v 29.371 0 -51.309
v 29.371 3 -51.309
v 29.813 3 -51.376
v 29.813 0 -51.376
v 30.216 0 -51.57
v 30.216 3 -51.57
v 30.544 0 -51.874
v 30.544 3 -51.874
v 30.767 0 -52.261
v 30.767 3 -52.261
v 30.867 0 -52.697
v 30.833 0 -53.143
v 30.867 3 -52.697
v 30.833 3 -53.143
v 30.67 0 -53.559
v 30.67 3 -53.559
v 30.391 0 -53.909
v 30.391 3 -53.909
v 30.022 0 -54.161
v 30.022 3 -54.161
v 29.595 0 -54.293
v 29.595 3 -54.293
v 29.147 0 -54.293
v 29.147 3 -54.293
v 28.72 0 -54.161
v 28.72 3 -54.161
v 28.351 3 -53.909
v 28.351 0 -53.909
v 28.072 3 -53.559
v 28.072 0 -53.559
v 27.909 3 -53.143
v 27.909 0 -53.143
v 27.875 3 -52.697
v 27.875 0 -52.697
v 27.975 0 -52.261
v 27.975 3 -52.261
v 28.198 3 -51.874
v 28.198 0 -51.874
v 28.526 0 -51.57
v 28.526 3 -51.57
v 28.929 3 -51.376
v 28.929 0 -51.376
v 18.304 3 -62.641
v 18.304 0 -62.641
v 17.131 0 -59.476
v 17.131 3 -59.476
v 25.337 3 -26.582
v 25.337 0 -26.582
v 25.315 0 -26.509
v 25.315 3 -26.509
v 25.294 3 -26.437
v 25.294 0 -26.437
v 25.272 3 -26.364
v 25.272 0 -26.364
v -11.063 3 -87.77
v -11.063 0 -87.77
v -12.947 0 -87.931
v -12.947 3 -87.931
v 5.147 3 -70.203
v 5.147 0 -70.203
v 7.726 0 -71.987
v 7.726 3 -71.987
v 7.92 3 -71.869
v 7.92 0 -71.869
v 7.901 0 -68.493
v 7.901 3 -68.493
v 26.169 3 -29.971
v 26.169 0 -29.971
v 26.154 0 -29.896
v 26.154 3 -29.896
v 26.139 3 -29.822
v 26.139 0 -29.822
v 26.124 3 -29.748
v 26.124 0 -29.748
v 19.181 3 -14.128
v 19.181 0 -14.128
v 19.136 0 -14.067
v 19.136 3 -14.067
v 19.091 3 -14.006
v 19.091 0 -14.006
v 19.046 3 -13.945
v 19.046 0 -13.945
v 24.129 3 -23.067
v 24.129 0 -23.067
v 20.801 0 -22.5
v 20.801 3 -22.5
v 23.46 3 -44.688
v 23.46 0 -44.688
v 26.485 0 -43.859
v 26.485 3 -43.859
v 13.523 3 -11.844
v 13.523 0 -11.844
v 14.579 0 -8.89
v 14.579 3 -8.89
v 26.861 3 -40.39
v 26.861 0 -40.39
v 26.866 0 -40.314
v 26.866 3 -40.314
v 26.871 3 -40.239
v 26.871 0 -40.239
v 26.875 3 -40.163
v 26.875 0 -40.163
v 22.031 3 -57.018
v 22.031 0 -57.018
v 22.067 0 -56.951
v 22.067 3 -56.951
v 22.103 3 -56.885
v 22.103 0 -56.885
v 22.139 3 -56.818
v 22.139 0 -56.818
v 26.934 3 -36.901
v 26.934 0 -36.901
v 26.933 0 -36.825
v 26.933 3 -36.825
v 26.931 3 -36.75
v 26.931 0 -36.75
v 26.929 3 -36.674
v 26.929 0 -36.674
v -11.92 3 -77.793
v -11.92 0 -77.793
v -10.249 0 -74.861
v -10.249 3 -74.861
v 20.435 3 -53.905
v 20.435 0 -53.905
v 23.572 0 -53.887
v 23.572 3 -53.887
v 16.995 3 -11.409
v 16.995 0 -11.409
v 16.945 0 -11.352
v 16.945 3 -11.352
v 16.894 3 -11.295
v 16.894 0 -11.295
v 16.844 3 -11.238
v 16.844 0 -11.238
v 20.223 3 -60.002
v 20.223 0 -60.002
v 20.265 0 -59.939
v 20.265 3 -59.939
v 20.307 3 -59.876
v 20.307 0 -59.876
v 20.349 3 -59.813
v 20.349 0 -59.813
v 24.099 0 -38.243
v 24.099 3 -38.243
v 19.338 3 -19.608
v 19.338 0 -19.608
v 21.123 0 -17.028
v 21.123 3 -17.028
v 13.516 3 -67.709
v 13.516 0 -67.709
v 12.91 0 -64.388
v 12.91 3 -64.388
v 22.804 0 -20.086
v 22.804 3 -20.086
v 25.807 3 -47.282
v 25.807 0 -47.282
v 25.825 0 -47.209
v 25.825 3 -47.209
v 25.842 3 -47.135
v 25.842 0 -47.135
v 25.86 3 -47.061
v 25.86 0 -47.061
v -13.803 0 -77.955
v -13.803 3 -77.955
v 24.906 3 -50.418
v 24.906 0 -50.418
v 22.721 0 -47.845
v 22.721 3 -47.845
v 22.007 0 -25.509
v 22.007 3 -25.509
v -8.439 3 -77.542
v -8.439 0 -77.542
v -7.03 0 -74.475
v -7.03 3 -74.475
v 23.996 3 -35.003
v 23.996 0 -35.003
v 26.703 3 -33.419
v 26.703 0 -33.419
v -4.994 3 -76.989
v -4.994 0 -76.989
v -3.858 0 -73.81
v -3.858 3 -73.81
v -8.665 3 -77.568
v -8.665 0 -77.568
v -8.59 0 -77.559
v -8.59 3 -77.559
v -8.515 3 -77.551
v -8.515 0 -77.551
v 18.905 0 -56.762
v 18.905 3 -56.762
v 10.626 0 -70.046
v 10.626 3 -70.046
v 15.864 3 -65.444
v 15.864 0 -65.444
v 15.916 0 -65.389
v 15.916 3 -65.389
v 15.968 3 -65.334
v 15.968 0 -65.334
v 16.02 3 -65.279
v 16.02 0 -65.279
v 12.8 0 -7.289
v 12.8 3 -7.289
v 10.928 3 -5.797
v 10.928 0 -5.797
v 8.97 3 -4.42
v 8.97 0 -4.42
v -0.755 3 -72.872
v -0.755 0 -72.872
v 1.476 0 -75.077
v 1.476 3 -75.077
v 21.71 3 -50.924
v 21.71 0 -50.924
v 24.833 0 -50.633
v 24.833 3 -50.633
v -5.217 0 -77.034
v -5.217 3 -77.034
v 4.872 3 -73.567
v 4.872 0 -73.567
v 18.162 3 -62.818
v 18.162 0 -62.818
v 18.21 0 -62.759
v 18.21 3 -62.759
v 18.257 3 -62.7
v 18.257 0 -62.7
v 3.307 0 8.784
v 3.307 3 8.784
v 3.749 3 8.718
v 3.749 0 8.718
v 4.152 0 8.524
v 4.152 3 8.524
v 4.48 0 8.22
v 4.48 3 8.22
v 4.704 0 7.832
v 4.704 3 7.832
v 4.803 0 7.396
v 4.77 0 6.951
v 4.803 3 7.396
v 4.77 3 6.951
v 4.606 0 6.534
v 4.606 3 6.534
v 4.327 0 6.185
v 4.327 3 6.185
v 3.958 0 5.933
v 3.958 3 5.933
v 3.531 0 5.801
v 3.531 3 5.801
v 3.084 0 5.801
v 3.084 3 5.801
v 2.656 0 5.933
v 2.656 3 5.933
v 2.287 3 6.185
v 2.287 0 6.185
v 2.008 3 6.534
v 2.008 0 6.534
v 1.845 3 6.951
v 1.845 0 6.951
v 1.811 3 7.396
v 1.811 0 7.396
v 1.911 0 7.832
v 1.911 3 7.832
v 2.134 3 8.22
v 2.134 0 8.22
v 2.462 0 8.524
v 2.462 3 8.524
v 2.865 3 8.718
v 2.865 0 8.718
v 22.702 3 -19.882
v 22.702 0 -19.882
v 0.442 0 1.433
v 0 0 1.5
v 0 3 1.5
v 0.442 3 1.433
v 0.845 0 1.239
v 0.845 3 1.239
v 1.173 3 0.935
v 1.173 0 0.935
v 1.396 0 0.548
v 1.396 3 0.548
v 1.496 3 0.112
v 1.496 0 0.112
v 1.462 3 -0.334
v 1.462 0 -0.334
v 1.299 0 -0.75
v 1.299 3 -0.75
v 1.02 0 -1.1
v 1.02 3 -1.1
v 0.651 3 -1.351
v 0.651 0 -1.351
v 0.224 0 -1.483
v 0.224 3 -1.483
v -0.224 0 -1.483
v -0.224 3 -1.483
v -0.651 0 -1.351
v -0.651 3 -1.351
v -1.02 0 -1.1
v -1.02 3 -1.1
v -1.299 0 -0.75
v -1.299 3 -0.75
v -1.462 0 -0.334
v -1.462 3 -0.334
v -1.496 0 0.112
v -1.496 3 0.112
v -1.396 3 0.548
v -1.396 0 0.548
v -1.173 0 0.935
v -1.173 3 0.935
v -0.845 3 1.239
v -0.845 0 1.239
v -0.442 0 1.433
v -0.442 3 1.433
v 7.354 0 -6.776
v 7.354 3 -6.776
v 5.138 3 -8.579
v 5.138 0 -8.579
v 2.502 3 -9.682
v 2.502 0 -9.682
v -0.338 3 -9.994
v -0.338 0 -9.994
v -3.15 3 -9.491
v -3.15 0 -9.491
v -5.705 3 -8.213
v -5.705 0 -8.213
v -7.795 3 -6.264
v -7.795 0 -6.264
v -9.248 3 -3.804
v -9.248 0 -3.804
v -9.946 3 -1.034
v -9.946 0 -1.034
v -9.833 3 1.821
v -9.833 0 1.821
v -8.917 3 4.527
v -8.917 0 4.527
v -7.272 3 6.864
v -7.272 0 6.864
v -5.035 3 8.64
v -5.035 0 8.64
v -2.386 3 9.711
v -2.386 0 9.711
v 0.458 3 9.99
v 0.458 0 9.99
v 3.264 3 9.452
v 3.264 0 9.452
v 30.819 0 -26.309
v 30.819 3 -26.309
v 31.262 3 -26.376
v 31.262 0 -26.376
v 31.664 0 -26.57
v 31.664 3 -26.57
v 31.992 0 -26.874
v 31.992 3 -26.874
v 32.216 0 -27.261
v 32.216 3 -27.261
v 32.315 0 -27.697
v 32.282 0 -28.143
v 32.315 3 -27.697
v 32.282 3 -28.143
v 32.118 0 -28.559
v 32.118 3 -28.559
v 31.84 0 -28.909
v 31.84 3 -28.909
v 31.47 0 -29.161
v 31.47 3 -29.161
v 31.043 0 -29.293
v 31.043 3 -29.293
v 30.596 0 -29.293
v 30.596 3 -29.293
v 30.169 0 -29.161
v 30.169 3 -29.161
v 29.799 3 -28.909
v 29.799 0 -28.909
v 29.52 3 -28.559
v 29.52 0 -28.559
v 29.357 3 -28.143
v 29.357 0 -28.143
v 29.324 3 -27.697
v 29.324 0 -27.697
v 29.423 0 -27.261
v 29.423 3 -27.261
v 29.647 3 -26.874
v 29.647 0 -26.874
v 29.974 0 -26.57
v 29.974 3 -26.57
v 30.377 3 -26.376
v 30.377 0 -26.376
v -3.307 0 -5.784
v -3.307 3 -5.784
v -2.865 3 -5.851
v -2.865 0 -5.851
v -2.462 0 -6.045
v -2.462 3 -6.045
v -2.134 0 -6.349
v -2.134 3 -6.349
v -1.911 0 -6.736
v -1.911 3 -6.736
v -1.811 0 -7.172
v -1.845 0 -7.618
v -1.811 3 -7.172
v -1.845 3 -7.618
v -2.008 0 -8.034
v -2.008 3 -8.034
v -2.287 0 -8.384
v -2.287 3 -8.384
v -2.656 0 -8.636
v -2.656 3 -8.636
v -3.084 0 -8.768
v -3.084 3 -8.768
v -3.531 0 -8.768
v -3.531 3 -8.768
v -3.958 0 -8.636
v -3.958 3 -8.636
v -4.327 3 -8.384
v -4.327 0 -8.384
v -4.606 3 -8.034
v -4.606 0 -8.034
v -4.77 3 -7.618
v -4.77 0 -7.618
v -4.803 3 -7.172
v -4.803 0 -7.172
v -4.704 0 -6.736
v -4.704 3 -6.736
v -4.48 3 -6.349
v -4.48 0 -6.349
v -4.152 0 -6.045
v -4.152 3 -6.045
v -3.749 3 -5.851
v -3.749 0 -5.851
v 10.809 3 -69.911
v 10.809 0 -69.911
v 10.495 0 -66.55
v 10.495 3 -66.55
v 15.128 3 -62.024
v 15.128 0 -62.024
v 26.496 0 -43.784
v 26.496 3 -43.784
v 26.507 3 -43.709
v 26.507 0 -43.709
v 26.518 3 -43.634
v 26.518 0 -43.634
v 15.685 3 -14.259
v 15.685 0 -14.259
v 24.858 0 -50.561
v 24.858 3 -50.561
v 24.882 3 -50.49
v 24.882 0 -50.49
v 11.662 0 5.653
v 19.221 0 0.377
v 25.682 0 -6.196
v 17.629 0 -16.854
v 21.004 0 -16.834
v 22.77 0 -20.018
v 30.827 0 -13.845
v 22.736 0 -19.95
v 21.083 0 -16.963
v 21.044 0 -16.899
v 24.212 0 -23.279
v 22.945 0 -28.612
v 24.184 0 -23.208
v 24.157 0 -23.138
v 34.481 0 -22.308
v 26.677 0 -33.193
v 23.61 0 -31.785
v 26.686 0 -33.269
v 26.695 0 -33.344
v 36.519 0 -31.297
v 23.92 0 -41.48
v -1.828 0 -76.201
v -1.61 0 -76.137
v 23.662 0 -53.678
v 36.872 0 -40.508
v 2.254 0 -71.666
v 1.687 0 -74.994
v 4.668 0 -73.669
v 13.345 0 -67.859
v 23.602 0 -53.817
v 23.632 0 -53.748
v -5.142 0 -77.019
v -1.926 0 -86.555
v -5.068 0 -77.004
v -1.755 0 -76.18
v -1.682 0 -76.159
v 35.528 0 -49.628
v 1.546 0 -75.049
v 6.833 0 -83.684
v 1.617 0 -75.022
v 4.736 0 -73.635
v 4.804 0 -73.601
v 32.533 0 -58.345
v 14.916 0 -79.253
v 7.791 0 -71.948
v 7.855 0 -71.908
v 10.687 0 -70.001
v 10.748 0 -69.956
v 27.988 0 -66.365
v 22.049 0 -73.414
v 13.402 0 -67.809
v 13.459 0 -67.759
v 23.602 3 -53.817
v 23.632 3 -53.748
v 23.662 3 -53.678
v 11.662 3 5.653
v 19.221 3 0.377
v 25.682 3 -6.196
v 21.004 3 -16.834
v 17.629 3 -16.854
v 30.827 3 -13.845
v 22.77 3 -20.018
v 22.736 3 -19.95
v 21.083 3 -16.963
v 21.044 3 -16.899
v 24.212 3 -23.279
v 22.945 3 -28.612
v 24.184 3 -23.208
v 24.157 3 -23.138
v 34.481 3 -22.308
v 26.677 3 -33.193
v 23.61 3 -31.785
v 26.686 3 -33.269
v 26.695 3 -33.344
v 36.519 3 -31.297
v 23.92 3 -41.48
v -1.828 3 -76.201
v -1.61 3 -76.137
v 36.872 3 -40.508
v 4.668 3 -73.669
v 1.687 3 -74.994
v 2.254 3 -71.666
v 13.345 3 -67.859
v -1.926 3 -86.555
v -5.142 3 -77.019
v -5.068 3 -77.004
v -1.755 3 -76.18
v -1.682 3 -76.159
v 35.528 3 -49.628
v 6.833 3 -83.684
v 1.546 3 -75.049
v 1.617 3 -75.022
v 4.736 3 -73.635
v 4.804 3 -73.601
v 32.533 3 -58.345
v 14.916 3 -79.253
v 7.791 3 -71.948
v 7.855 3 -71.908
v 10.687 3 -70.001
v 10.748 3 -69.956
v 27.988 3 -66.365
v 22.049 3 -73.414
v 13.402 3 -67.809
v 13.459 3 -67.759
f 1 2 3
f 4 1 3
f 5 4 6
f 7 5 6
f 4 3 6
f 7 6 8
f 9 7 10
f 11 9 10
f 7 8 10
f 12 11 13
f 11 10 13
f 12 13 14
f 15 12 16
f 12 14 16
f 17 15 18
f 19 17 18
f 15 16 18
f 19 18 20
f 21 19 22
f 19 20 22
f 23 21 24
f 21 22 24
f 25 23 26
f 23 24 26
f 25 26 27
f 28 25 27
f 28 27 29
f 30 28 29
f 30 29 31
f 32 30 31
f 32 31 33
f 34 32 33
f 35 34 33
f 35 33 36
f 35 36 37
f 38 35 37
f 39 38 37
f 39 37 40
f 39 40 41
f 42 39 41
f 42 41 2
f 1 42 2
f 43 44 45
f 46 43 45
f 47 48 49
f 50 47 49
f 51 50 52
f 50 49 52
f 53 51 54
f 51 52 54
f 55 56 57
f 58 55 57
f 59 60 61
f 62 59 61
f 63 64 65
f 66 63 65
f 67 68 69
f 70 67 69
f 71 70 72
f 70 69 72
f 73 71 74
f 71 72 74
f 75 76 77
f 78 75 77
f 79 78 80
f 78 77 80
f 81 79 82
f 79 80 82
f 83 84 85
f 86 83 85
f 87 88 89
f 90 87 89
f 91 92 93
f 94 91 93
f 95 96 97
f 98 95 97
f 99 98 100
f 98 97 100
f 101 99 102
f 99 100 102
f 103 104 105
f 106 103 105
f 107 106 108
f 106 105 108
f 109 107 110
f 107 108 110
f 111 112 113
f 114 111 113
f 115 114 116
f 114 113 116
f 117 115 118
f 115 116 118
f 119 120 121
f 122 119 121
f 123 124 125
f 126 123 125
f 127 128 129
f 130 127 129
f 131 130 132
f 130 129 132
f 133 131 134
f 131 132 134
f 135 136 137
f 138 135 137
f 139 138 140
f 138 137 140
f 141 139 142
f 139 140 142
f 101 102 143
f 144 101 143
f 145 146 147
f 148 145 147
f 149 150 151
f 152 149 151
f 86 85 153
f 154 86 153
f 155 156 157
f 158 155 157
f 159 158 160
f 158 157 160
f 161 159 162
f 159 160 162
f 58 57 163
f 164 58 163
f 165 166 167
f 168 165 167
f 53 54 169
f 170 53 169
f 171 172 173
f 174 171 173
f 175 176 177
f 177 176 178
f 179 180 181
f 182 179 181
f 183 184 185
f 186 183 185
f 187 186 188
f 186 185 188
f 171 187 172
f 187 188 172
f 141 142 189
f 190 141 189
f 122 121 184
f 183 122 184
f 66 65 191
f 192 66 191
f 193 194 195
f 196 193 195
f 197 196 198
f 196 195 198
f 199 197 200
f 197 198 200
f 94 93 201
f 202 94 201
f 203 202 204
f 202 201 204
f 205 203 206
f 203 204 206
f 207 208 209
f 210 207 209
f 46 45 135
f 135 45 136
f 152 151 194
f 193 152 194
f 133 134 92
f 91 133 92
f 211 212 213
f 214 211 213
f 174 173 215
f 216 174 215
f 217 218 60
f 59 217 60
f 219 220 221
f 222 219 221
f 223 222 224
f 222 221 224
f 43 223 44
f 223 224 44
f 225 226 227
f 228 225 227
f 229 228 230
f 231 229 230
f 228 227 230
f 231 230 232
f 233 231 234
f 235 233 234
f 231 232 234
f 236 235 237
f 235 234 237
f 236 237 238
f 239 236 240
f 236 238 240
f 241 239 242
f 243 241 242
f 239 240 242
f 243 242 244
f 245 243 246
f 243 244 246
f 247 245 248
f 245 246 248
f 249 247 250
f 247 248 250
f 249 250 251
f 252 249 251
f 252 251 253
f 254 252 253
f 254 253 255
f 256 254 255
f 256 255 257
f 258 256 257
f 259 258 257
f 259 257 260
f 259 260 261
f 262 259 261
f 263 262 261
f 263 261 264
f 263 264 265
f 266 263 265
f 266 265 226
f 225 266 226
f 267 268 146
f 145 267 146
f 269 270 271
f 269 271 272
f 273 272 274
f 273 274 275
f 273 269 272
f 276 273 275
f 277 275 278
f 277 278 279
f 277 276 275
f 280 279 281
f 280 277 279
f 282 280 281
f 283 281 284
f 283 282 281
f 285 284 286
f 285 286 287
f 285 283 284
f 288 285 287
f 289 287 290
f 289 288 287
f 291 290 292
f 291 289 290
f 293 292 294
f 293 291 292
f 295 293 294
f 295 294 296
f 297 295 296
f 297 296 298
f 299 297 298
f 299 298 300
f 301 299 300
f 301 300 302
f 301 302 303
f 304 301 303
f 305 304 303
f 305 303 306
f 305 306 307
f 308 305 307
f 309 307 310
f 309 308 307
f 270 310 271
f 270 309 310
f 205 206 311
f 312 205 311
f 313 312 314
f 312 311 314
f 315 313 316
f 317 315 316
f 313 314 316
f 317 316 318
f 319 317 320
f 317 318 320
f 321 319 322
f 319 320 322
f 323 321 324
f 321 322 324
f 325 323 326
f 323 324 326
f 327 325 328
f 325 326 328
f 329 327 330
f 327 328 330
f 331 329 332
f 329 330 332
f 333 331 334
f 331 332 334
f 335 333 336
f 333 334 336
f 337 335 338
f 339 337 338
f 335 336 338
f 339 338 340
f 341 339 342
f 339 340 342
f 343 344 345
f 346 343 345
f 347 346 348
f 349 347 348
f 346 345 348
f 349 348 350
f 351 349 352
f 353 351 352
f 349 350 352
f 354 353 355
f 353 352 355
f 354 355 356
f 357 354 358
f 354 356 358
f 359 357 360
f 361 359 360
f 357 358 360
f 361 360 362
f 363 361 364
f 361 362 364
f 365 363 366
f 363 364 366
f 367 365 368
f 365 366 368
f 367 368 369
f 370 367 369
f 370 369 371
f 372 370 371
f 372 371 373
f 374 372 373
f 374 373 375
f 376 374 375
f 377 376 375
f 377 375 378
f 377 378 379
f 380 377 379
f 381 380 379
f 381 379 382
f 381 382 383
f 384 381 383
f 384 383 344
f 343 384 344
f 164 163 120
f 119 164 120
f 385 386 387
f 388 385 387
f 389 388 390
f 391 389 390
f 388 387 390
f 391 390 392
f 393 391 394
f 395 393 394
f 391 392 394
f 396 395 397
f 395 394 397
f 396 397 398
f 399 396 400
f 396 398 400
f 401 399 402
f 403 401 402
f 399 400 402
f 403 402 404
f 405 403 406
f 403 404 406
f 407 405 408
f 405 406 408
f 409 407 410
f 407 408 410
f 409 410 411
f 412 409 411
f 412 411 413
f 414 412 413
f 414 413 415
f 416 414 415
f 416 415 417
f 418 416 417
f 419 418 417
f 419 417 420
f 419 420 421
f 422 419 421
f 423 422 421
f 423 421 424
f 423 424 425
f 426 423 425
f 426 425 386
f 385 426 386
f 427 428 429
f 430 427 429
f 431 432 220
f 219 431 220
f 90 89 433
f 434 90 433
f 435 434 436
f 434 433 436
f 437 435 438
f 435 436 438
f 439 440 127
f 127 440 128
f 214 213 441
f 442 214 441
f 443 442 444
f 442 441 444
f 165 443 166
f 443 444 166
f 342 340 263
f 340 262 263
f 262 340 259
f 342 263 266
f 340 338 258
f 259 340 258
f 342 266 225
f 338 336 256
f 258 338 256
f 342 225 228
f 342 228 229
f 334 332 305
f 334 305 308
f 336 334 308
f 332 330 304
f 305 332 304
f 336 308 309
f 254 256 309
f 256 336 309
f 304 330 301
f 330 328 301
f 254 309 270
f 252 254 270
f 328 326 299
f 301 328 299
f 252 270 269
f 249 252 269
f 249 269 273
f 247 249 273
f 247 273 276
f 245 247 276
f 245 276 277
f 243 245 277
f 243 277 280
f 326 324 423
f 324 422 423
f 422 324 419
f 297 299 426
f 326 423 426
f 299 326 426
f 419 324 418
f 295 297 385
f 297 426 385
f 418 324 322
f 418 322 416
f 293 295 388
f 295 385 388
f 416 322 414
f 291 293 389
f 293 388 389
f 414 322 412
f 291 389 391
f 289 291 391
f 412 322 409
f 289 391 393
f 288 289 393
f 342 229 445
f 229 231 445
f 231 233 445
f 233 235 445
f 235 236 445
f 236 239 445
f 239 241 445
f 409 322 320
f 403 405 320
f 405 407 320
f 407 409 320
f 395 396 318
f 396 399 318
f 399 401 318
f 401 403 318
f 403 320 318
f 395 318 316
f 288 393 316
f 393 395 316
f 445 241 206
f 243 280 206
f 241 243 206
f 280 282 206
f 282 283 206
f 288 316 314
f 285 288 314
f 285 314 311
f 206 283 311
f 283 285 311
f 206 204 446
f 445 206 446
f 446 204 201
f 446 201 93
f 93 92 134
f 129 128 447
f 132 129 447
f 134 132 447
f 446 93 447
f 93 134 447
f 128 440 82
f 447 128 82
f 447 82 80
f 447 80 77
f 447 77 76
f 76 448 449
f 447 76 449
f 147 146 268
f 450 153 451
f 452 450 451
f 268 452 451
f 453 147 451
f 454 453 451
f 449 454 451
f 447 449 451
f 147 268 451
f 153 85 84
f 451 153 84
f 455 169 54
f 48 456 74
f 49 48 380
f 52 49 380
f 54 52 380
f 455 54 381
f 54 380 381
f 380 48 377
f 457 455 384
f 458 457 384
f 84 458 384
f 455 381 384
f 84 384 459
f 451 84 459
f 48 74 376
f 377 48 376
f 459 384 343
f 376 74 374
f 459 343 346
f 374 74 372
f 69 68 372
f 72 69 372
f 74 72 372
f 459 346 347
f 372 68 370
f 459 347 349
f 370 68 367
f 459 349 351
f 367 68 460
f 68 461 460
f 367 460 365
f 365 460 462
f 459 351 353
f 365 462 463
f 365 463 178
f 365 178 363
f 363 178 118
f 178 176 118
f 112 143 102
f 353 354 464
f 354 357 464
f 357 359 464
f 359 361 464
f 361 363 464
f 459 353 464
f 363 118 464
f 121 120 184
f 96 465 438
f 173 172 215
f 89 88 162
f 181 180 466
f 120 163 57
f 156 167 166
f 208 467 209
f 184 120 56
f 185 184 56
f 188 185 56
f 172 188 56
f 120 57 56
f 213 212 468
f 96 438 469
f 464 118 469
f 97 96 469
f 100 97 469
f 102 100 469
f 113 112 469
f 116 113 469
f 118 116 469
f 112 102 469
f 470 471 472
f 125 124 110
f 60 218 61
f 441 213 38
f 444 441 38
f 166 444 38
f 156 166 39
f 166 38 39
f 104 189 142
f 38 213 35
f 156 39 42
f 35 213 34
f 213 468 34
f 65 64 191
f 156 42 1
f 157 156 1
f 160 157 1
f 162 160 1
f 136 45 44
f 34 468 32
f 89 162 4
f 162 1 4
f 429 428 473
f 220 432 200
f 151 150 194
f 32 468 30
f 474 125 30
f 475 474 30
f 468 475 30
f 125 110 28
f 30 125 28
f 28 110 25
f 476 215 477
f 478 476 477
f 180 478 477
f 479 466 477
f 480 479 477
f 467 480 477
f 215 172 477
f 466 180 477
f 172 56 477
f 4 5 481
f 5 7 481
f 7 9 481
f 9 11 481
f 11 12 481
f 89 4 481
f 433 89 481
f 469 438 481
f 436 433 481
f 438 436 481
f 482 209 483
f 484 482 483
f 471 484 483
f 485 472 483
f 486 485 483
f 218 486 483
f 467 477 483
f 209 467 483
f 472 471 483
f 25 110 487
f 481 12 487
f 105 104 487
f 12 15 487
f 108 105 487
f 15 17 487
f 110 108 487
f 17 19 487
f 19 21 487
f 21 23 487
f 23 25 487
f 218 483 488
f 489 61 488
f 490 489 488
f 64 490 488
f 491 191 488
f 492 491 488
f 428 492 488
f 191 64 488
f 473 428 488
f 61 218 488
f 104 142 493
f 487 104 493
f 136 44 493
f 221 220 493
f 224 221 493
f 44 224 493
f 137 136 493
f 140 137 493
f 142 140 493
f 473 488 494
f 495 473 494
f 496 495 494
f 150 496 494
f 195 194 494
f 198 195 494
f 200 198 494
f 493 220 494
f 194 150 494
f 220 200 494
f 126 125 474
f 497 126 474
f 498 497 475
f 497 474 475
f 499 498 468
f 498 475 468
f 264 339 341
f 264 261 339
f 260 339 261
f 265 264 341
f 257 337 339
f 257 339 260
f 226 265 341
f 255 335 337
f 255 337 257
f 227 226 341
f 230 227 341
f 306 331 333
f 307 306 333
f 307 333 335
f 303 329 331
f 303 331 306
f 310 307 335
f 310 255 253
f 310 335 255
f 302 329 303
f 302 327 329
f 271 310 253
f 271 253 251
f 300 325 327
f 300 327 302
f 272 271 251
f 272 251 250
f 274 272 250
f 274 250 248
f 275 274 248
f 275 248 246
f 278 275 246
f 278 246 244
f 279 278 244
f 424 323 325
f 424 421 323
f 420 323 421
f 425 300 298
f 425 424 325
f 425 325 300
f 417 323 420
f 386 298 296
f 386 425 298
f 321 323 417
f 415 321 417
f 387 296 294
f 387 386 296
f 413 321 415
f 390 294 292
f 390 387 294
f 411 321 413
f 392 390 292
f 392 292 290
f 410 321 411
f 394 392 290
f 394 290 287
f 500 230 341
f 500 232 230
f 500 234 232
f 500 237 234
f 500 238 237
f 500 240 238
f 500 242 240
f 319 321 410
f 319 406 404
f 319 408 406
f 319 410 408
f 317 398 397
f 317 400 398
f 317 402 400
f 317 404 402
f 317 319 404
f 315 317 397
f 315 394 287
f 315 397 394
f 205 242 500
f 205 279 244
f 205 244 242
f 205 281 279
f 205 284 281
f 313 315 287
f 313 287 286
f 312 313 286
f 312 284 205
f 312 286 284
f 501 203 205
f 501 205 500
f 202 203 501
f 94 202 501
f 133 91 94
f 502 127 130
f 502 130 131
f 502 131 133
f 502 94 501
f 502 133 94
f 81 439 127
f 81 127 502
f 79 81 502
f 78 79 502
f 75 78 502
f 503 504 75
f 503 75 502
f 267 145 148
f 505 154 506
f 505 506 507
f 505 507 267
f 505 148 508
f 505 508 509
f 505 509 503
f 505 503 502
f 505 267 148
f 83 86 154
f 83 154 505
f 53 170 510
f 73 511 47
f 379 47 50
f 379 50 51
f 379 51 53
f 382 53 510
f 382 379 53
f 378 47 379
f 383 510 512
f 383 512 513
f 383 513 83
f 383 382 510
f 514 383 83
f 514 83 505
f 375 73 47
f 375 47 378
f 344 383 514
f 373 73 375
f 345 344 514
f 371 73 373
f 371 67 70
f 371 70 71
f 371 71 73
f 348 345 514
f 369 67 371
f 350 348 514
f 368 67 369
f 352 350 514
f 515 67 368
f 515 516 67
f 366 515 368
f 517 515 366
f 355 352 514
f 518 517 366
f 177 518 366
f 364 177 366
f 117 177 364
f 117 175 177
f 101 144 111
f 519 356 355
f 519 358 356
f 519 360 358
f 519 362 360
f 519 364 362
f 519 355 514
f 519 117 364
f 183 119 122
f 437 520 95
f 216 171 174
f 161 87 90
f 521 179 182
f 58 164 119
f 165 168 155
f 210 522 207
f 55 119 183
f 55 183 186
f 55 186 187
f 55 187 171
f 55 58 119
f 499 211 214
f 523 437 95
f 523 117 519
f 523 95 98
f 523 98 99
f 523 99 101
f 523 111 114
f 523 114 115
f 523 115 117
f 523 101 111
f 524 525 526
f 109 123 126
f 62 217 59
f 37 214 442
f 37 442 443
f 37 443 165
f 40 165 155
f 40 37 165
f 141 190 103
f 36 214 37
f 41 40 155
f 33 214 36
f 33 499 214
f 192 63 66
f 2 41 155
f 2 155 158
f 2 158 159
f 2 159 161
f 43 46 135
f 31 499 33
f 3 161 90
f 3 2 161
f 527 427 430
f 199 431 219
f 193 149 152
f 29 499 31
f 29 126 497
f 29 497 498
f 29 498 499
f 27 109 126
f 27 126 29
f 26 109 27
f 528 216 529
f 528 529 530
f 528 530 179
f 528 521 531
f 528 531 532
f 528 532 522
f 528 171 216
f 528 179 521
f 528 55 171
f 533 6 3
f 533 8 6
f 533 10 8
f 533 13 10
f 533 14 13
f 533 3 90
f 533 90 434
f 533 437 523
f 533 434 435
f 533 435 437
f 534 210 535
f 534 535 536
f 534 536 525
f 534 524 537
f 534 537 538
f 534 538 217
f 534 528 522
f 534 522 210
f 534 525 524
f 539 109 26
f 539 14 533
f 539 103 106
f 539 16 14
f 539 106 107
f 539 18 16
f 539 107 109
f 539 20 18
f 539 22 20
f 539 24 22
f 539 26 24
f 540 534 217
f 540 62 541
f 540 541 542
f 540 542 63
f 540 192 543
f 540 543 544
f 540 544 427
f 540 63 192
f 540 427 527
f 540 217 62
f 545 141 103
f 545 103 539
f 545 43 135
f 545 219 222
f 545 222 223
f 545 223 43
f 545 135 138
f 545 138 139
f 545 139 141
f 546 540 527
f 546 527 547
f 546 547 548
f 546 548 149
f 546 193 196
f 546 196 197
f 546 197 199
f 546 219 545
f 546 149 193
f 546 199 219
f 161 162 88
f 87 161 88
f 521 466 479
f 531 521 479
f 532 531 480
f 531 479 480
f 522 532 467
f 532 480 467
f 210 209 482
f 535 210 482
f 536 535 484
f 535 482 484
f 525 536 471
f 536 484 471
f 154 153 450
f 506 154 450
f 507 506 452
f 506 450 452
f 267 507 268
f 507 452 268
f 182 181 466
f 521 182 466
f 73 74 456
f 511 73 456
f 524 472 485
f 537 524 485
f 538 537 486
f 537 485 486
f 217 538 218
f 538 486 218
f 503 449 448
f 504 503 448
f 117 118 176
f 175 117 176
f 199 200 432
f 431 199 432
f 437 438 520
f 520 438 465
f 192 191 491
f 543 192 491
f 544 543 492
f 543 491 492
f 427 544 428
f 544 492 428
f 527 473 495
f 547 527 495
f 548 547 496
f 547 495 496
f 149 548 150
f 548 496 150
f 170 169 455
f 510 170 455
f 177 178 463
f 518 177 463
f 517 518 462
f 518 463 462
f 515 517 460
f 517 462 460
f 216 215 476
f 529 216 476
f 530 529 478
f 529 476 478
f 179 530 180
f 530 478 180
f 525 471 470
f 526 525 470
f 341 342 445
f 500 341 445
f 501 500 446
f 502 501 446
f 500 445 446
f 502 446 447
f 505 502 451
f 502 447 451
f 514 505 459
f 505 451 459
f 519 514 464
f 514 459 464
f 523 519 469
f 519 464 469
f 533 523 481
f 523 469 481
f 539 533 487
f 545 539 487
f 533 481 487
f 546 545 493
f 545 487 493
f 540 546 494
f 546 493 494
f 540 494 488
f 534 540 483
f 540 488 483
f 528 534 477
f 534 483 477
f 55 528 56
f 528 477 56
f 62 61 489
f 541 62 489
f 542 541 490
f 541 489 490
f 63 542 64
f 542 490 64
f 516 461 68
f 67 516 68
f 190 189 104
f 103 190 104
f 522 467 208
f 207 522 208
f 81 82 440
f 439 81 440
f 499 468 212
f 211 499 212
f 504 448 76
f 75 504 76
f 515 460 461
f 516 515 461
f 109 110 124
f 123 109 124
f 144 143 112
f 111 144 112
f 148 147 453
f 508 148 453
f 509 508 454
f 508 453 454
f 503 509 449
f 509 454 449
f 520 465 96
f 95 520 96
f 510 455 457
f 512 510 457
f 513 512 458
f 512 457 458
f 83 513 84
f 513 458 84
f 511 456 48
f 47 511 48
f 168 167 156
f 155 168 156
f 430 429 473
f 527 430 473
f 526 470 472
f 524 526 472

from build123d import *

# Parameters (mm, degrees)
SKETCH_1_R          = 1.5
EXTRUDE_1_DEPTH     = 3
SKETCH_2_R          = 1.5
CUT_EXTRUDE_1_DEPTH = 35
SKETCH_3_R          = 1.5
CUT_EXTRUDE_2_DEPTH = 10


with BuildPart() as part:
    # 草图1 → 凸台-拉伸1 (new body)
    with BuildSketch(Plane(origin=(0, 0, 0), x_dir=(1, 0, 0), z_dir=(0, 1, 0))):
        with BuildLine():
            Line((-11.919787954, 77.793366188), (-10.248955421, 74.860550413))
            Line((-10.248955421, 74.860550413), (-8.665067312, 77.567824645))
            ThreePointArc((-8.665067312, 77.567824645), (-8.552157803, 77.555194327), (-8.439284624, 77.542243357))
            Line((-8.439284624, 77.542243357), (-7.03042185, 74.474965181))
            Line((-7.03042185, 74.474965181), (-5.216606417, 77.033892473))
            ThreePointArc((-5.216606417, 77.033892473), (-5.105227368, 77.011469504), (-4.993912457, 76.988730272))
            Line((-4.993912457, 76.988730272), (-3.857741739, 73.810333533))
            Line((-3.857741739, 73.810333533), (-1.827803212, 76.201438903))
            ThreePointArc((-1.827803212, 76.201438903), (-1.718802284, 76.169393937), (-1.609892815, 76.1370395))
            Line((-1.609892815, 76.1370395), (-0.755061098, 72.871713718))
            Line((-0.755061098, 72.871713718), (1.475551464, 75.07679941))
            ThreePointArc((1.475551464, 75.07679941), (1.581344708, 75.035376328), (1.687019869, 74.993652924))
            Line((1.687019869, 74.993652924), (2.254006799, 71.666249199))
            Line((2.254006799, 71.666249199), (4.668317088, 73.66853318))
            ThreePointArc((4.668317088, 73.66853318), (4.770097497, 73.618047236), (4.871734098, 73.567272405))
            Line((4.871734098, 73.567272405), (5.146561129, 70.203114289))
            Line((5.146561129, 70.203114289), (7.726194786, 71.987357968))
            ThreePointArc((7.726194786, 71.987357968), (7.82318775, 71.928193392), (7.920012274, 71.868753561))
            Line((7.920012274, 71.868753561), (7.900587806, 68.493444328))
            Line((7.900587806, 68.493444328), (10.625912261, 70.046068534))
            ThreePointArc((10.625912261, 70.046068534), (10.717379605, 69.978675602), (10.808655161, 69.911023145))
            Line((10.808655161, 69.911023145), (10.495127025, 66.550250936))
            Line((10.495127025, 66.550250936), (13.345400914, 67.859439261))
            ThreePointArc((13.345400914, 67.859439261), (13.430646516, 67.784330876), (13.51567844, 67.708980668))
            Line((13.51567844, 67.708980668), (12.910432776, 64.38832299))
            Line((12.910432776, 64.38832299), (15.863963793, 65.44411172))
            ThreePointArc((15.863963793, 65.44411172), (15.942338882, 65.361859501), (16.020480031, 65.279385002))
            Line((16.020480031, 65.279385002), (15.128123123, 62.024114065))
            Line((15.128123123, 62.024114065), (18.162433114, 62.818468011))
            ThreePointArc((18.162433114, 62.818468011), (18.233341209, 62.729697948), (18.303996881, 62.640726839))
            Line((18.303996881, 62.640726839), (17.131320104, 59.47561722))
            Line((17.131320104, 59.47561722), (20.223316137, 60.002490868))
            ThreePointArc((20.223316137, 60.002490868), (20.286217585, 59.907878554), (20.348850048, 59.81308796))
            Line((20.348850048, 59.81308796), (18.90477818, 56.762228053))
            Line((18.90477818, 56.762228053), (22.030928299, 57.017611578))
            ThreePointArc((22.030928299, 57.017611578), (22.085344382, 56.917877069), (22.139476964, 56.817988403))
            Line((22.139476964, 56.817988403), (20.435000265, 53.904597096))
            Line((20.435000265, 53.904597096), (23.57151258, 53.886546873))
            ThreePointArc((23.57151258, 53.886546873), (23.617029157, 53.782449211), (23.662249878, 53.678222686))
            Line((23.662249878, 53.678222686), (21.710340444, 50.924472645))
            Line((21.710340444, 50.924472645), (24.833344202, 50.633126049))
            ThreePointArc((24.833344202, 50.633126049), (24.869614866, 50.525457478), (24.905579569, 50.417686321))
            Line((24.905579569, 50.417686321), (22.721092609, 47.844535247))
            Line((22.721092609, 47.844535247), (25.806819865, 47.2821096))
            ThreePointArc((25.806819865, 47.2821096), (25.833568575, 47.171689544), (25.860003545, 47.061193959))
            Line((25.860003545, 47.061193959), (23.459564325, 44.688225085))
            Line((23.459564325, 44.688225085), (26.484530833, 43.859000786))
            ThreePointArc((26.484530833, 43.859000786), (26.501554013, 43.746669609), (26.518258066, 43.634290532))
            Line((26.518258066, 43.634290532), (23.920135376, 41.479563585))
            Line((23.920135376, 41.479563585), (26.861319314, 40.389851532))
            ThreePointArc((26.861319314, 40.389851532), (26.868487408, 40.276464141), (26.875333415, 40.163056847))
            Line((26.875333415, 40.163056847), (24.09930054, 38.242970598))
            Line((24.09930054, 38.242970598), (26.934317721, 36.901064158))
            ThreePointArc((26.934317721, 36.901064158), (26.931576177, 36.7874835), (26.928512036, 36.673911086))
            Line((26.928512036, 36.673911086), (23.99569626, 35.003078552))
            Line((23.99569626, 35.003078552), (26.702970493, 33.419190443))
            ThreePointArc((26.702970493, 33.419190443), (26.690340174, 33.306280935), (26.677389205, 33.193407756))
            Line((26.677389205, 33.193407756), (23.610111028, 31.784544982))
            Line((23.610111028, 31.784544982), (26.16903832, 29.970729549))
            ThreePointArc((26.16903832, 29.970729549), (26.146615352, 29.8593505), (26.123876119, 29.748035589))
            Line((26.123876119, 29.748035589), (22.945479381, 28.611864871))
            Line((22.945479381, 28.611864871), (25.336584751, 26.581926344))
            ThreePointArc((25.336584751, 26.581926344), (25.304539784, 26.472925416), (25.272185348, 26.364015947))
            Line((25.272185348, 26.364015947), (22.006859566, 25.50918423))
            Line((22.006859566, 25.50918423), (24.211945258, 23.278571668))
            ThreePointArc((24.211945258, 23.278571668), (24.170522175, 23.172778424), (24.128798771, 23.067103263))
            Line((24.128798771, 23.067103263), (20.801395047, 22.500116333))
            Line((20.801395047, 22.500116333), (22.803679027, 20.085806044))
            ThreePointArc((22.803679027, 20.085806044), (22.753193083, 19.984025635), (22.702418252, 19.882389034))
            Line((22.702418252, 19.882389034), (19.338260136, 19.607562003))
            Line((19.338260136, 19.607562003), (21.122503815, 17.027928346))
            ThreePointArc((21.122503815, 17.027928346), (21.063339239, 16.930935382), (21.003899408, 16.834110857))
            Line((21.003899408, 16.834110857), (17.628590175, 16.853535326))
            Line((17.628590175, 16.853535326), (19.181214381, 14.12821087))
            ThreePointArc((19.181214381, 14.12821087), (19.11382145, 14.036743527), (19.046168992, 13.945467971))
            Line((19.046168992, 13.945467971), (15.685396784, 14.258996107))
            Line((15.685396784, 14.258996107), (16.994585109, 11.408722218))
            ThreePointArc((16.994585109, 11.408722218), (16.919476724, 11.323476616), (16.844126515, 11.238444692))
            Line((16.844126515, 11.238444692), (13.523468837, 11.843690356))
            Line((13.523468837, 11.843690356), (14.579257567, 8.890159339))
            ThreePointArc((14.579257567, 8.890159339), (11.875157779, 6.528999379), (8.970254591, 4.419788747))
            ThreePointArc((8.970254591, 4.419788747), (-9.248107271, 3.804275476), (3.263841378, -9.452372161))
            ThreePointArc((3.263841378, -9.452372161), (36.41039757, 45.099089654), (-11.063458372, 87.769795947))
            Line((-11.063458372, 87.769795947), (-12.946912918, 87.931462784))
            Line((-12.946912918, 87.931462784), (-13.8032425, 77.955033025))
            Line((-13.8032425, 77.955033025), (-11.919787954, 77.793366188))
        make_face()
        with Locations(Location((0, 0, 0), (0, 0, 270))):
            Circle(SKETCH_1_R, mode=Mode.SUBTRACT)
    extrude(amount=EXTRUDE_1_DEPTH)

    # 草图2 → 切除-拉伸1 (cut)
    with BuildSketch(Plane(origin=(0, 3, 0), x_dir=(1, 0, 0), z_dir=(0, 1, 0))):
        with Locations(Location((-3.307239505, 7.284378275, 0), (0, 0, 270))):
            Circle(SKETCH_2_R)
        with Locations(Location((3.307239505, -7.284378275, 0), (0, 0, 270))):
            Circle(SKETCH_2_R)
    extrude(amount=-CUT_EXTRUDE_1_DEPTH, mode=Mode.SUBTRACT)

    # 草图3 → 切除-拉伸2 (cut)
    with BuildSketch(Plane(origin=(0, 3, 0), x_dir=(1, 0, 0), z_dir=(0, 1, 0))):
        with Locations(Location((30.819456427, 27.809488642, 0), (0, 0, 270))):
            Circle(SKETCH_3_R)
        with Locations(Location((29.371041361, 52.809488642, 0), (0, 0, 270))):
            Circle(SKETCH_3_R)
    extrude(amount=-CUT_EXTRUDE_2_DEPTH, mode=Mode.SUBTRACT)


solid = part.part
